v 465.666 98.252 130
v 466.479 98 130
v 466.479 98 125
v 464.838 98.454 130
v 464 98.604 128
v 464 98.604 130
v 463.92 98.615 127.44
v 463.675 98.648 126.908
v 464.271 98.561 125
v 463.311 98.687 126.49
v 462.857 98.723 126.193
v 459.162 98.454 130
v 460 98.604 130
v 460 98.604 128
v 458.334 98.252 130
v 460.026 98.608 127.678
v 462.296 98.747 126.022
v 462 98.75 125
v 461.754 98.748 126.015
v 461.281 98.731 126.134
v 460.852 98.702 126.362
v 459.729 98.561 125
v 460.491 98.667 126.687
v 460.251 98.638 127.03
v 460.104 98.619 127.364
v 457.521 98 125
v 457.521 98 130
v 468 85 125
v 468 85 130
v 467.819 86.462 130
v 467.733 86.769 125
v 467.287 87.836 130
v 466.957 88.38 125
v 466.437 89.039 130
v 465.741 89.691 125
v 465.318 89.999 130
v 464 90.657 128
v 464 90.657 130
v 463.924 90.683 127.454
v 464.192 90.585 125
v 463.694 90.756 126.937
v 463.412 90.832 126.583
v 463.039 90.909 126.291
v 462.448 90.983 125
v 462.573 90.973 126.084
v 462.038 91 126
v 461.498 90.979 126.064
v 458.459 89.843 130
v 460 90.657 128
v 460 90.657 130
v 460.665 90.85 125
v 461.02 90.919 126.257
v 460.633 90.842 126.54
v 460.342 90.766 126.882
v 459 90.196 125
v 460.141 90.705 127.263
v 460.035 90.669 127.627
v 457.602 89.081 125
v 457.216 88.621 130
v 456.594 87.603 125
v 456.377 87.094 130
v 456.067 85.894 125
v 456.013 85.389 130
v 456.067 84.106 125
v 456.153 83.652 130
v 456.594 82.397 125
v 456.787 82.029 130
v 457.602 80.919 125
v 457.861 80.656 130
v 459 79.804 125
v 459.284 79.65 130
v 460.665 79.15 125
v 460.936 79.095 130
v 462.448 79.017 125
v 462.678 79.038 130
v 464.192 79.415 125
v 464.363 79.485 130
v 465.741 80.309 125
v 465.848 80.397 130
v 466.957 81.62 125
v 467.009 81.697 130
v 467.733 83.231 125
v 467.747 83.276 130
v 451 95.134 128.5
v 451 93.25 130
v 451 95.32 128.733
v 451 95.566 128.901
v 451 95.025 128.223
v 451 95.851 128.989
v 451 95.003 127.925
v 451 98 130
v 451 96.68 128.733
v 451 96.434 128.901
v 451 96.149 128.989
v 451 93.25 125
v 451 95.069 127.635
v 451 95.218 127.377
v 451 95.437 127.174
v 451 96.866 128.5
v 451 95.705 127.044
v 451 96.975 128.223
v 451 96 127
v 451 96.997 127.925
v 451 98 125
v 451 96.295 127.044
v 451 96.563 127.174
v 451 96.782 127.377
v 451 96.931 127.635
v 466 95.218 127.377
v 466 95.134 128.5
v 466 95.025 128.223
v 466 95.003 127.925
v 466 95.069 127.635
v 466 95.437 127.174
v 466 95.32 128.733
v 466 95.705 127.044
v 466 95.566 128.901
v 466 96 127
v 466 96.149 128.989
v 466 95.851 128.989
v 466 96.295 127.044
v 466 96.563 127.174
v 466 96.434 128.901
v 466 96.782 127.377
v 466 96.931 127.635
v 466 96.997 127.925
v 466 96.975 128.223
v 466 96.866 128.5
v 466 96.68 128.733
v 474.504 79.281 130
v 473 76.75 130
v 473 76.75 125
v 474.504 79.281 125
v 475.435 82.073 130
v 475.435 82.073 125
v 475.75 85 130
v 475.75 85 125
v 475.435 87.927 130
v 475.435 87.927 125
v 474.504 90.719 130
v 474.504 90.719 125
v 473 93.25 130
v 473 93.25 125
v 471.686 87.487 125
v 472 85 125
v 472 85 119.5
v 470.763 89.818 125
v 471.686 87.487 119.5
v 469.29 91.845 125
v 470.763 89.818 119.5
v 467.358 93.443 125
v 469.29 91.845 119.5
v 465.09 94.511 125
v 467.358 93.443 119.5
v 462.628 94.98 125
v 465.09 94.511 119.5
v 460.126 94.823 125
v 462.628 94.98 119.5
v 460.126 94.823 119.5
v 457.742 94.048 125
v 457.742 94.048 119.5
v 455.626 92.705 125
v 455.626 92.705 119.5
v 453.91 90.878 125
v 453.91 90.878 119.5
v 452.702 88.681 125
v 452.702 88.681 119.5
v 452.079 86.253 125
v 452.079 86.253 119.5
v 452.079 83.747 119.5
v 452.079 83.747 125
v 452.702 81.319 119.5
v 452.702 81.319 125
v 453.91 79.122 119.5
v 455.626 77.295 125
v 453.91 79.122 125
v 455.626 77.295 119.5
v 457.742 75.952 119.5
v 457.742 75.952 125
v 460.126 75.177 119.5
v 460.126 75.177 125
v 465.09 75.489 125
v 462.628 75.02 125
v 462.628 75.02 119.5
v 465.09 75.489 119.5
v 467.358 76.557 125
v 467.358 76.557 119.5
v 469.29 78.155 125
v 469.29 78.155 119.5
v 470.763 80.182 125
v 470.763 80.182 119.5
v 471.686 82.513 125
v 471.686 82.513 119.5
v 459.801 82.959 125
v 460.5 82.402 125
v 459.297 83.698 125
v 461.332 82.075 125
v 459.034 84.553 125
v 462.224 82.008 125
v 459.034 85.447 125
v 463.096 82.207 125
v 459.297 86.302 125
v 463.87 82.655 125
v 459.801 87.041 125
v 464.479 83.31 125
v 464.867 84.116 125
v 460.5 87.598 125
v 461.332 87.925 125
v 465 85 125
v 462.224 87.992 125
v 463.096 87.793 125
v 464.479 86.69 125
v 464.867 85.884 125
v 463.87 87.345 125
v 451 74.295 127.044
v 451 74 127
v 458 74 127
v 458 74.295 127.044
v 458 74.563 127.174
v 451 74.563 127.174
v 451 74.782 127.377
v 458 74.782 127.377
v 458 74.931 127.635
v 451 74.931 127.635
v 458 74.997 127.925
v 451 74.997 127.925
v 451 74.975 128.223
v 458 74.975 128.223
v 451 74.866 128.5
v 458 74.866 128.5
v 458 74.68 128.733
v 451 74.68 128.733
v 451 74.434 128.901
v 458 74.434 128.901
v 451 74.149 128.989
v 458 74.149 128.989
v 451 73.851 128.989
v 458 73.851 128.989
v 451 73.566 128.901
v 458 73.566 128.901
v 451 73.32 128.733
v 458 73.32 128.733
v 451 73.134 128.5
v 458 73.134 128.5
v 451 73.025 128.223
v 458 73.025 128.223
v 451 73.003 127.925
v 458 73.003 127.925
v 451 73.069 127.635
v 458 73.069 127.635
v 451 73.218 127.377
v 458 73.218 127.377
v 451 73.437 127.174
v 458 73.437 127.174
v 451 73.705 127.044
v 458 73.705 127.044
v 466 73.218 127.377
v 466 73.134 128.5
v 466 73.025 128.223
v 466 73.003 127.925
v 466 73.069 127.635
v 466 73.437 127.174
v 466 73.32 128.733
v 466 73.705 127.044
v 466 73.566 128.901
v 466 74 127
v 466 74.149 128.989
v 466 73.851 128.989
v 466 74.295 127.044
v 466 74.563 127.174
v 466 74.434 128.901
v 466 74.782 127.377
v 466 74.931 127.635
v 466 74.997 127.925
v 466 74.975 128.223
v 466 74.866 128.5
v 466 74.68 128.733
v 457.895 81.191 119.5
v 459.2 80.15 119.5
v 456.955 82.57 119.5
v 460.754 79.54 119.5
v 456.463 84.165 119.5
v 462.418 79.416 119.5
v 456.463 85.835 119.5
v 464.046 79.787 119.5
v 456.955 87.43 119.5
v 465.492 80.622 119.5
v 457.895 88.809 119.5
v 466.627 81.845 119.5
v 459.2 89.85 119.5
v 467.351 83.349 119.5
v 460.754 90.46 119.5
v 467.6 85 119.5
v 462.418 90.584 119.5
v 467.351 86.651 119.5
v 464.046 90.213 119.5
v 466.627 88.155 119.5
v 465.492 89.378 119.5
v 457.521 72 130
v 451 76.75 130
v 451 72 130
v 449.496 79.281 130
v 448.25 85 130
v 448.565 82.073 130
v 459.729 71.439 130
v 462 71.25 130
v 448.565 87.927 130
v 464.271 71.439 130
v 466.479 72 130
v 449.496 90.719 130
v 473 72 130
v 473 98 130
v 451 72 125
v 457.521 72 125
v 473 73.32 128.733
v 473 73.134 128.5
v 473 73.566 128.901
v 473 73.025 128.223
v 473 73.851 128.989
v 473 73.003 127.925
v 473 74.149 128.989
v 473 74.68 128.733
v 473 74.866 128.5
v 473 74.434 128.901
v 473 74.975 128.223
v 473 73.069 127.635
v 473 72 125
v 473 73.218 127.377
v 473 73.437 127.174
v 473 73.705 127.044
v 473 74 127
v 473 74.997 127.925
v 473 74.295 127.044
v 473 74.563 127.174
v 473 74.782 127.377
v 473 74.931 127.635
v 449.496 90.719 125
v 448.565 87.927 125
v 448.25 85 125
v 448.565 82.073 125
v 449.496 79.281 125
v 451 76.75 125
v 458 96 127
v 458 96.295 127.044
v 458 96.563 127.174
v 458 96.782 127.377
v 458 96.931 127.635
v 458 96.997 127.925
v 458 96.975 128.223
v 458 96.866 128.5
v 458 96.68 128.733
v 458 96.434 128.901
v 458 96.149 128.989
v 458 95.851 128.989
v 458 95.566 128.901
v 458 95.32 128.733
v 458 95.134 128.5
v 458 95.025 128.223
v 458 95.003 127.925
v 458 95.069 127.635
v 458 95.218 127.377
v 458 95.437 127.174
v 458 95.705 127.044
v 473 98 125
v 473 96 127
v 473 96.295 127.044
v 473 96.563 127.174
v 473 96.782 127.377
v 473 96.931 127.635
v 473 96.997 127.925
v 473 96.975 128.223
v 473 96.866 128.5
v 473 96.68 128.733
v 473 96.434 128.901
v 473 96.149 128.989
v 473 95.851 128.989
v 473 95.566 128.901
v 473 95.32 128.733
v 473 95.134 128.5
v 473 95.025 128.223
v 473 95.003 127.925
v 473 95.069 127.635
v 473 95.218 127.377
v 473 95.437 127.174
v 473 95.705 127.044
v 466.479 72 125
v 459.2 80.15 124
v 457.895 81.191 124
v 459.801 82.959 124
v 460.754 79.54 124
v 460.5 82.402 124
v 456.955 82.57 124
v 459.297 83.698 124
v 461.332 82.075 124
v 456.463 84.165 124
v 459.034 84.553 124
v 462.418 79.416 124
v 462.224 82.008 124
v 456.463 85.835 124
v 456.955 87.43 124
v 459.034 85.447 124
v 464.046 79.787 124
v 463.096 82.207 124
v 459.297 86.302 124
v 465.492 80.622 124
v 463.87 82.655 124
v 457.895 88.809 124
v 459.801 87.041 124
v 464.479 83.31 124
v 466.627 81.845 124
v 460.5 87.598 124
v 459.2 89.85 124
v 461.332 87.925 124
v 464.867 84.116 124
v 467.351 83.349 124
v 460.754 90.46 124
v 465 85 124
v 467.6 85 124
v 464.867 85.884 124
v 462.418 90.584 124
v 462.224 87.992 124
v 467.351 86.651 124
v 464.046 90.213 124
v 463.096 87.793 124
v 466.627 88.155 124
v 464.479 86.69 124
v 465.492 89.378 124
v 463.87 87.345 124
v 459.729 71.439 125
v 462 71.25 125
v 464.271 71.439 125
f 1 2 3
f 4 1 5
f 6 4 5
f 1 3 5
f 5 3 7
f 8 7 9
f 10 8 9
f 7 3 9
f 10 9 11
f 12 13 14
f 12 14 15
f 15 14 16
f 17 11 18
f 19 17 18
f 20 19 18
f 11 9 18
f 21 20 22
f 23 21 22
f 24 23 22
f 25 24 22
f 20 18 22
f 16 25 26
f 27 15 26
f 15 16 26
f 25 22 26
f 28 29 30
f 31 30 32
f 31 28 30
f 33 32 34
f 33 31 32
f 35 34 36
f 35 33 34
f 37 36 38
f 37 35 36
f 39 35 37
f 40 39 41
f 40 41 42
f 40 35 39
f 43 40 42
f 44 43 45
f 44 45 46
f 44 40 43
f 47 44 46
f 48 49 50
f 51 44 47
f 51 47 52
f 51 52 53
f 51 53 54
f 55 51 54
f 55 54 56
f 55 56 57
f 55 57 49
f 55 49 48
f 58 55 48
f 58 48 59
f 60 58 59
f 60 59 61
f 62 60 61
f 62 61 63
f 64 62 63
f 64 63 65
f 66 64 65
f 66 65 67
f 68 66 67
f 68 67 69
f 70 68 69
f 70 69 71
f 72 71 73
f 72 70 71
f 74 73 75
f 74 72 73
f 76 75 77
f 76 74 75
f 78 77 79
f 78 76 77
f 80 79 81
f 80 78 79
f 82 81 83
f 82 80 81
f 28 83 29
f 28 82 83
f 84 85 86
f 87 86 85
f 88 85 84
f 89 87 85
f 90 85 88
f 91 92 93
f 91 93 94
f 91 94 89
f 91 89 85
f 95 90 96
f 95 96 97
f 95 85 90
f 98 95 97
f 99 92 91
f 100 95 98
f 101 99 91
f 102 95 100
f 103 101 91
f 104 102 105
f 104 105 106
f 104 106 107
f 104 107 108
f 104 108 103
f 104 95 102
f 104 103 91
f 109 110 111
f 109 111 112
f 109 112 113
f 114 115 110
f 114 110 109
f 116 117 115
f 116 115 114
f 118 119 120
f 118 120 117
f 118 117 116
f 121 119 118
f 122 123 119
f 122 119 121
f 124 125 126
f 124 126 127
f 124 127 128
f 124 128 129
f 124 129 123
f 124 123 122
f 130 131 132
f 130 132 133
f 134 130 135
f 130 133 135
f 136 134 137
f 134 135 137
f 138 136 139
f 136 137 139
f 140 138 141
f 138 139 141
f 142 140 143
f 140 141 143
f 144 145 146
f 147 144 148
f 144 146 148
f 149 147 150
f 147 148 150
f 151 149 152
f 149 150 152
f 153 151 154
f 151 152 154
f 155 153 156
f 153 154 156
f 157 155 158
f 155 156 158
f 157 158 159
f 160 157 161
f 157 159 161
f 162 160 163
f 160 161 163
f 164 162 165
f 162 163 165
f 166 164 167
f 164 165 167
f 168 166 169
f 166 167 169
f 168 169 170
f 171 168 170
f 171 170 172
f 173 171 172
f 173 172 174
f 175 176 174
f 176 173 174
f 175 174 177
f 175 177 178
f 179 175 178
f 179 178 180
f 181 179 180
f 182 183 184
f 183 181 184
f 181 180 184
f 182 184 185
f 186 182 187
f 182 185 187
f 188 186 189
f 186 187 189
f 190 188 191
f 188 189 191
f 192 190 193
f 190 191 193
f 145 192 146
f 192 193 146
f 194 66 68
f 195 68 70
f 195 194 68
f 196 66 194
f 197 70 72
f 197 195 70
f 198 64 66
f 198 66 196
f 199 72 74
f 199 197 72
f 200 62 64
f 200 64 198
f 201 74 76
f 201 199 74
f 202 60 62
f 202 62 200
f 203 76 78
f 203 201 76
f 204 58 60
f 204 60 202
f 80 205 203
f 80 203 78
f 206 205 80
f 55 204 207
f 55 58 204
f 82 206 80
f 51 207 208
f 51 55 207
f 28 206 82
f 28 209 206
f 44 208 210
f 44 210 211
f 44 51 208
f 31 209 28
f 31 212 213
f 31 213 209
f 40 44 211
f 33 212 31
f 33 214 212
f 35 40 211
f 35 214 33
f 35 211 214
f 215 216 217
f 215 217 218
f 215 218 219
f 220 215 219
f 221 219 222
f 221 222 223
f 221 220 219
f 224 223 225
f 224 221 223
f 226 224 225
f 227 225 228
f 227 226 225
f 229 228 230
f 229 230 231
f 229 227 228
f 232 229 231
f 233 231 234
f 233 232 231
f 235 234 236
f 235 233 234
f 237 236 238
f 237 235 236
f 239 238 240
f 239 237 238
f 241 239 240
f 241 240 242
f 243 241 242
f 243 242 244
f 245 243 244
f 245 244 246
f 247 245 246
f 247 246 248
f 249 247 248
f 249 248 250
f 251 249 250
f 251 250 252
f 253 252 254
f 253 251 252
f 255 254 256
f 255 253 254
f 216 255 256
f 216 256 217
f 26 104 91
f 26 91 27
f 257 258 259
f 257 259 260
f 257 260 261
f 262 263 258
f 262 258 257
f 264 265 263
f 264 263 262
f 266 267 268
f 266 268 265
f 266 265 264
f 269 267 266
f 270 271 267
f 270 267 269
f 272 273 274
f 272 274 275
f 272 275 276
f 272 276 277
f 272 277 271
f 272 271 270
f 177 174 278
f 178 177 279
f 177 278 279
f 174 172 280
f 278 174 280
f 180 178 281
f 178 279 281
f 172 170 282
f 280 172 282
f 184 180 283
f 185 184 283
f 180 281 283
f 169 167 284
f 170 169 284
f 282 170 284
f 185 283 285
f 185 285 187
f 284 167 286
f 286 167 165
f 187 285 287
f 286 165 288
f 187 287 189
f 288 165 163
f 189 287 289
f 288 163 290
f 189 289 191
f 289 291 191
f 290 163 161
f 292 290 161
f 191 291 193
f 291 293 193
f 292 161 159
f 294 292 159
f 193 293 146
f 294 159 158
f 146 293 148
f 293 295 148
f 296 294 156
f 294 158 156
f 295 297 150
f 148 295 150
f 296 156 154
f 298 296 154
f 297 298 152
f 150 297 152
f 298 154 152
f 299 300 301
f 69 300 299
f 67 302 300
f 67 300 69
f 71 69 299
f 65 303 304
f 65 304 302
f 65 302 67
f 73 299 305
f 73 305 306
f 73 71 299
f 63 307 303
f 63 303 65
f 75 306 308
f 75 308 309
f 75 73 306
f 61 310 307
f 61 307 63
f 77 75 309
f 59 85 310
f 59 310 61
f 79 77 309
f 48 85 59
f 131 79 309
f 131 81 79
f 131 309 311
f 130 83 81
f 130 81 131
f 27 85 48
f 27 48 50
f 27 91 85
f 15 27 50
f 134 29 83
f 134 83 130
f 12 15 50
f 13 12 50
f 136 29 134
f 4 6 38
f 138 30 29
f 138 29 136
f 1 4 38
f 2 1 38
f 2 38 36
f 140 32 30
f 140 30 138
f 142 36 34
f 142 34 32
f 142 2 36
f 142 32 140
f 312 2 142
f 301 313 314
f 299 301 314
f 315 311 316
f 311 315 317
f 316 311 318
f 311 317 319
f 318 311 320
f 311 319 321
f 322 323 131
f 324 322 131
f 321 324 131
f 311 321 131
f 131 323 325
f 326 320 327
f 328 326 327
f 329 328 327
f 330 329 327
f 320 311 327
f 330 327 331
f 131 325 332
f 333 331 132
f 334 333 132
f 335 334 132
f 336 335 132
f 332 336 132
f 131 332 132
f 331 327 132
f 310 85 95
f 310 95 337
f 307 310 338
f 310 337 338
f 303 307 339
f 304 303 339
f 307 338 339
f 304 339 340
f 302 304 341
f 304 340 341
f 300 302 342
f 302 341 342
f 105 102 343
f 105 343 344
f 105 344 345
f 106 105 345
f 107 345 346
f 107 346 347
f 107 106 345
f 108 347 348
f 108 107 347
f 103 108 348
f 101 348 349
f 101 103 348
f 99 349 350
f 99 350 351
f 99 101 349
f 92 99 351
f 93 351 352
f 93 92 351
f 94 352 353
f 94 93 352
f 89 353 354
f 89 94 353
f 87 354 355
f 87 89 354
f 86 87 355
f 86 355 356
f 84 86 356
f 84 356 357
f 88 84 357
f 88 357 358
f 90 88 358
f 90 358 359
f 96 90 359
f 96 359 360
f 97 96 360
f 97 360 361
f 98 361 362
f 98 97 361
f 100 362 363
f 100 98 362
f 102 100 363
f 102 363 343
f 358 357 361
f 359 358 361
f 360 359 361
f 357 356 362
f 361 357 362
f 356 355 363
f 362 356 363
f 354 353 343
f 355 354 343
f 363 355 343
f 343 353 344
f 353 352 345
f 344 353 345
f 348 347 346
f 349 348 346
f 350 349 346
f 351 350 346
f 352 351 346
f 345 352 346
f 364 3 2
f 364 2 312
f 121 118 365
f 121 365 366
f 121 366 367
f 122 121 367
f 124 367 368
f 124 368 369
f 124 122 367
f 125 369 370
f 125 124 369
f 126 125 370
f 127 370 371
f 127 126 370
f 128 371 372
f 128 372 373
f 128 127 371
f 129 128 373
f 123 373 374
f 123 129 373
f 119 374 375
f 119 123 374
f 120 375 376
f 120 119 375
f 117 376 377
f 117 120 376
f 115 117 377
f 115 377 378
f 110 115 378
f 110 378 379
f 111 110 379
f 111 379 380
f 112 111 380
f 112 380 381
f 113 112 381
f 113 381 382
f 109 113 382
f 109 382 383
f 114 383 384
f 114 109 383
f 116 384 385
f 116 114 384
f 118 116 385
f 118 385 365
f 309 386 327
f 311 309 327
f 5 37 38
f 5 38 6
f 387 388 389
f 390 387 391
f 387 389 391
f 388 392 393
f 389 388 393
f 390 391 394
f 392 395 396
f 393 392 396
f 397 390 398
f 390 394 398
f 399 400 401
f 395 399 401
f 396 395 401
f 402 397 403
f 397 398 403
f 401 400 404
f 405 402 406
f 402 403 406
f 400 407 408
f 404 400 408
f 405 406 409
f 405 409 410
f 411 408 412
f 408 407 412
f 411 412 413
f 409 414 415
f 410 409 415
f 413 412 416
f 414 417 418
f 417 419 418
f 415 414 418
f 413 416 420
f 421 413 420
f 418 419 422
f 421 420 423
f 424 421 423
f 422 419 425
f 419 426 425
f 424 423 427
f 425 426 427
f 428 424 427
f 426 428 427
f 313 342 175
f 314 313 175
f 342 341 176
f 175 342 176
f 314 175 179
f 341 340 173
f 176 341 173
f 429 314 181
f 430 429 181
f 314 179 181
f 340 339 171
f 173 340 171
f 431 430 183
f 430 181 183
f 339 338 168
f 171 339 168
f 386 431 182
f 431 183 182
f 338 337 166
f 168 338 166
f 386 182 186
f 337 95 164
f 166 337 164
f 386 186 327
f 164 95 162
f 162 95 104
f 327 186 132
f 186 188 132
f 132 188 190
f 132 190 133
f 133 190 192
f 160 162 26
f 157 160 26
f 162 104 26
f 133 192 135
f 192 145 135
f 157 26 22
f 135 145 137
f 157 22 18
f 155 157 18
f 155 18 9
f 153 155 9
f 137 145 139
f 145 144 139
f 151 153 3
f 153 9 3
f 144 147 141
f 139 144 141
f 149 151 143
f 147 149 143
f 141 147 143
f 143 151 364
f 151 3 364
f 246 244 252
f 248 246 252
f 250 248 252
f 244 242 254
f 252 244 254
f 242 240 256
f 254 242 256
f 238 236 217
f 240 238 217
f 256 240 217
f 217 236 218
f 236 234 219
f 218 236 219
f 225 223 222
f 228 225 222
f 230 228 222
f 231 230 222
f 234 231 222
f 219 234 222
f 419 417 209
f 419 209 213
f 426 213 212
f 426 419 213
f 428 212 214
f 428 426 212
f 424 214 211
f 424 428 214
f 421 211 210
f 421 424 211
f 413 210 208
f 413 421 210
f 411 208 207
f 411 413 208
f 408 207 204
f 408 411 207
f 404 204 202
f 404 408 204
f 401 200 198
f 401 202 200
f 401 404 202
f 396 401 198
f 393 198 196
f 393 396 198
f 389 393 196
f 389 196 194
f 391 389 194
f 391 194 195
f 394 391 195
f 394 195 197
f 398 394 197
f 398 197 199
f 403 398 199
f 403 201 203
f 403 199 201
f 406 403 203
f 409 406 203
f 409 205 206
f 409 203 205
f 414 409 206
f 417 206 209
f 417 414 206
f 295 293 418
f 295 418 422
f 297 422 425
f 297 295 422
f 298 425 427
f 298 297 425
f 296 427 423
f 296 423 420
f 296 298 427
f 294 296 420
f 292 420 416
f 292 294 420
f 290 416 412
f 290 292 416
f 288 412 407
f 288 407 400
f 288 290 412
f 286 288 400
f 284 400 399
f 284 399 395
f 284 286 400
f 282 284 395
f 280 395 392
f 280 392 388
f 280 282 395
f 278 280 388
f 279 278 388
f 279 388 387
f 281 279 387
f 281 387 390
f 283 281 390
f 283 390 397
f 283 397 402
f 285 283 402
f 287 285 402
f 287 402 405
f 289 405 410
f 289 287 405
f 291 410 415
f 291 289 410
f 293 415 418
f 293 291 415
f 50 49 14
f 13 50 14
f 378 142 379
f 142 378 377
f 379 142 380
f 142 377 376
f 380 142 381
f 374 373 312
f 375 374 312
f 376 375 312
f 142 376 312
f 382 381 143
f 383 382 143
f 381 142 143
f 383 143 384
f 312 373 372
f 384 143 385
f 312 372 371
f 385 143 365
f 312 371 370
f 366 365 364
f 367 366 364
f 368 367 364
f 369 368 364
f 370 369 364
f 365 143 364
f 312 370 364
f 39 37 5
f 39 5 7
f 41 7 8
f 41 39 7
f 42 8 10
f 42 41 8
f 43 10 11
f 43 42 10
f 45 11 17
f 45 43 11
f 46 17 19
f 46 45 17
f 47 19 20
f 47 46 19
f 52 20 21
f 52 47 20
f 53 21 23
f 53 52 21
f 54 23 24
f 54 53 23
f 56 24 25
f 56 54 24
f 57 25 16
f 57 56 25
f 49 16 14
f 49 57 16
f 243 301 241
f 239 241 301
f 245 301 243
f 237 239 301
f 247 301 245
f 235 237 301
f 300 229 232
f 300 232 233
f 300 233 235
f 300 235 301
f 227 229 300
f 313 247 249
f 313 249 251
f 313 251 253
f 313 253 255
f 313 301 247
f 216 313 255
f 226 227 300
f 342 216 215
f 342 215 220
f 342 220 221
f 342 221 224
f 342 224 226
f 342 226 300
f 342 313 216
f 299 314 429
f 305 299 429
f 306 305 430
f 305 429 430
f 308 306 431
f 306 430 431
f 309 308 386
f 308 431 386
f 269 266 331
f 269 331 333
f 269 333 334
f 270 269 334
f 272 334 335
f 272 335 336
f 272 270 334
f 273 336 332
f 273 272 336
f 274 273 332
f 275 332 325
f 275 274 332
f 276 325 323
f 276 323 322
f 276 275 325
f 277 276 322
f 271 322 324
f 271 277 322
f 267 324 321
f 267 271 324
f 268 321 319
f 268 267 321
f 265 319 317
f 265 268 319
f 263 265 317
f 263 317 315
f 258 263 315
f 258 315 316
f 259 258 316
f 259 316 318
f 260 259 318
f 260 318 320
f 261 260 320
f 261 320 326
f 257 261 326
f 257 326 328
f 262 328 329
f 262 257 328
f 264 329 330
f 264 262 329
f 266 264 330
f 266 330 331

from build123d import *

# Parameters (mm, degrees)
CYLINDER1317_R     = 1
CYLINDER1317_DEPTH = 7
CYLINDER1318_R     = 1
CYLINDER1318_DEPTH = 7
CYLINDER1319_R     = 1
CYLINDER1319_DEPTH = 7
CYLINDER1320_R     = 1
CYLINDER1320_DEPTH = 7
BOX543_W           = 4
BOX543_H           = 11
BOX543_DEPTH       = 4
CYLINDER1293_R     = 2
CYLINDER1293_DEPTH = 11
CYLINDER1292_R     = 3
CYLINDER1292_DEPTH = 6.5
CYLINDER1286_R     = 6
CYLINDER1286_DEPTH = 6.5
CYLINDER1310_R     = 13.75
CYLINDER1310_DEPTH = 5
CYLINDER1291_R     = 5.6
CYLINDER1291_DEPTH = 4.5
CYLINDER1290_R     = 10
CYLINDER1290_DEPTH = 6
BOX507_W           = 22
BOX507_H           = 26
BOX507_DEPTH       = 5


with BuildPart() as cylinder1317:
    # Cylinder1317 → Cylinder1317 (new body)
    with BuildSketch(Plane(origin=(439, 96, 121), x_dir=(0, 0, -1), z_dir=(1, 0, 0))):
        Circle(CYLINDER1317_R)
    extrude(amount=CYLINDER1317_DEPTH)


with BuildPart() as fusion248002050190:
    # Cylinder1318 → Cylinder1318 (new body)
    with BuildSketch(Plane(origin=(439, 74, 121), x_dir=(0, 0, -1), z_dir=(1, 0, 0))):
        Circle(CYLINDER1318_R)
    extrude(amount=CYLINDER1318_DEPTH)

    # Fusion248002050190: union Cylinder1317
    add(cylinder1317.part)


with BuildPart() as fusion248002050190_1:
    # Fusion248002050190 placement: moved
    add(fusion248002050190.part.moved(Location((12, 0, 7))))


with BuildPart() as cylinder1319:
    # Cylinder1319 → Cylinder1319 (new body)
    with BuildSketch(Plane(origin=(439, 96, 121), x_dir=(0, 0, -1), z_dir=(1, 0, 0))):
        Circle(CYLINDER1319_R)
    extrude(amount=CYLINDER1319_DEPTH)


with BuildPart() as fusion248002050192:
    # Cylinder1320 → Cylinder1320 (new body)
    with BuildSketch(Plane(origin=(439, 74, 121), x_dir=(0, 0, -1), z_dir=(1, 0, 0))):
        Circle(CYLINDER1320_R)
    extrude(amount=CYLINDER1320_DEPTH)

    # Fusion248002050191: union Cylinder1319
    add(cylinder1319.part)


with BuildPart() as fusion248002050192_1:
    # Fusion248002050191 placement: moved
    add(fusion248002050192.part.moved(Location((27, 0, 7))))

    # Fusion248002050192: union Fusion248002050190
    add(fusion248002050190_1.part)


with BuildPart() as cube769:
    # Box543 → Box543 (new body)
    with BuildSketch(Plane(origin=(460, 88, 128), x_dir=(1, 0, 0), z_dir=(0, 0, 1))):
        with Locations((2, 5.5)):
            Rectangle(BOX543_W, BOX543_H)
    extrude(amount=BOX543_DEPTH)


with BuildPart() as fusion248002050172:
    # Cylinder1293 → Cylinder1293 (new body)
    with BuildSketch(Plane(origin=(462, 88, 128), x_dir=(1, 0, 0), z_dir=(0, 1, 0))):
        Circle(CYLINDER1293_R)
    extrude(amount=CYLINDER1293_DEPTH)

    # Fusion248002050172: union Cube769
    add(cube769.part)


with BuildPart() as cylinder1292:
    # Cylinder1292 → Cylinder1292 (new body)
    with BuildSketch(Plane(origin=(462, 85, 123), x_dir=(1, 0, 0), z_dir=(0, 0, 1))):
        Circle(CYLINDER1292_R)
    extrude(amount=CYLINDER1292_DEPTH)


with BuildPart() as cylinder1286:
    # Cylinder1286 → Cylinder1286 (new body)
    with BuildSketch(Plane(origin=(462, 85, 125), x_dir=(1, 0, 0), z_dir=(0, 0, 1))):
        Circle(CYLINDER1286_R)
    extrude(amount=CYLINDER1286_DEPTH)


with BuildPart() as cylinder1310:
    # Cylinder1310 → Cylinder1310 (new body)
    with BuildSketch(Plane(origin=(462, 85, 125), x_dir=(1, 0, 0), z_dir=(0, 0, 1))):
        Circle(CYLINDER1310_R)
    extrude(amount=CYLINDER1310_DEPTH)


with BuildPart() as cylinder1291:
    # Cylinder1291 → Cylinder1291 (new body)
    with BuildSketch(Plane(origin=(462, 85, 119.5), x_dir=(1, 0, 0), z_dir=(0, 0, 1))):
        Circle(CYLINDER1291_R)
    extrude(amount=CYLINDER1291_DEPTH)


with BuildPart() as cut014301:
    # Cylinder1290 → Cylinder1290 (new body)
    with BuildSketch(Plane(origin=(462, 85, 119.5), x_dir=(1, 0, 0), z_dir=(0, 0, 1))):
        Circle(CYLINDER1290_R)
    extrude(amount=CYLINDER1290_DEPTH)

    # Cut014301: cut Cylinder1291
    add(cylinder1291.part, mode=Mode.SUBTRACT)


with BuildPart() as bucket_head:
    # Box507 → Box507 (new body)
    with BuildSketch(Plane(origin=(451, 72, 125), x_dir=(1, 0, 0), z_dir=(0, 0, 1))):
        with Locations((11, 13)):
            Rectangle(BOX507_W, BOX507_H)
    extrude(amount=BOX507_DEPTH)

    # Fusion248002050171: union Cut014301
    add(cut014301.part)

    # Fusion248002050186: union Cylinder1310
    add(cylinder1310.part)

    # Cut014314: cut Cylinder1286
    add(cylinder1286.part, mode=Mode.SUBTRACT)

    # Cut014315: cut Cylinder1292
    add(cylinder1292.part, mode=Mode.SUBTRACT)

    # Cut014316: cut Fusion248002050172
    add(fusion248002050172.part, mode=Mode.SUBTRACT)

    # Cut014318: cut Fusion248002050192
    add(fusion248002050192_1.part, mode=Mode.SUBTRACT)


solid = bucket_head.part
